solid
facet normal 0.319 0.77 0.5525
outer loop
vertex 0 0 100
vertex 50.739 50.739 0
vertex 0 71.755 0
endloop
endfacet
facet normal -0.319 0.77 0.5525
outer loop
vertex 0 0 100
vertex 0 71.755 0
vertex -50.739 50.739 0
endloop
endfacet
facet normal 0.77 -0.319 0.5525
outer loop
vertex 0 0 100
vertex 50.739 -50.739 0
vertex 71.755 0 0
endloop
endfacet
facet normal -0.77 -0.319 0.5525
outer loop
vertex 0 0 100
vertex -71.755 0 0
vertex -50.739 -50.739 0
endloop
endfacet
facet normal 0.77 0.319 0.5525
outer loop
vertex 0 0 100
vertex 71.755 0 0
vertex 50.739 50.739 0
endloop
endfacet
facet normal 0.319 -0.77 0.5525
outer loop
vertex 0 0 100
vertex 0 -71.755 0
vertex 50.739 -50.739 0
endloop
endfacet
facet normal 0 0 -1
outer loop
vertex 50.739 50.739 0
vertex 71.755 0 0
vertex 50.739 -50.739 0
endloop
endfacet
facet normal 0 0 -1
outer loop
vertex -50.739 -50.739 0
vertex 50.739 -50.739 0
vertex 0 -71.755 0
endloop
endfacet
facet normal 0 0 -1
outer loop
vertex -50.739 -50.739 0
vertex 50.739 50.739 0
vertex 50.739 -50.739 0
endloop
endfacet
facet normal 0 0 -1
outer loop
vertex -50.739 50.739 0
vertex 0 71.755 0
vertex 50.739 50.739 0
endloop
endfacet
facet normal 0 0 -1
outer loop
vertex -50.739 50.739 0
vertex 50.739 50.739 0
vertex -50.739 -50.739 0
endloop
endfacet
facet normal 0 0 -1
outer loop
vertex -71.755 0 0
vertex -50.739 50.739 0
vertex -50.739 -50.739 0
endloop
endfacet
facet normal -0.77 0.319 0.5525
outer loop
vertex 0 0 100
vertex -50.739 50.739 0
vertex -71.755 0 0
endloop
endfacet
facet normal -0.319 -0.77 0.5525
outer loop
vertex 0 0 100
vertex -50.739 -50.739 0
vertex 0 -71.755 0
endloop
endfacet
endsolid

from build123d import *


with BuildPart() as f3:
    # F0 (on Top) → F3 section 0
    with BuildSketch(Plane.XY, mode=Mode.PRIVATE) as f3_s0:
        Polygon((50.738705, 50.738705), (0, 71.755365), (-50.738705, 50.738705), (-71.755365, 0), (-50.738705, -50.738705), (0, -71.755365), (50.738705, -50.738705), (71.755365, 0), align=None)
    loft([Vertex(0, 0, 100), f3_s0.sketch])


solid = f3.part
